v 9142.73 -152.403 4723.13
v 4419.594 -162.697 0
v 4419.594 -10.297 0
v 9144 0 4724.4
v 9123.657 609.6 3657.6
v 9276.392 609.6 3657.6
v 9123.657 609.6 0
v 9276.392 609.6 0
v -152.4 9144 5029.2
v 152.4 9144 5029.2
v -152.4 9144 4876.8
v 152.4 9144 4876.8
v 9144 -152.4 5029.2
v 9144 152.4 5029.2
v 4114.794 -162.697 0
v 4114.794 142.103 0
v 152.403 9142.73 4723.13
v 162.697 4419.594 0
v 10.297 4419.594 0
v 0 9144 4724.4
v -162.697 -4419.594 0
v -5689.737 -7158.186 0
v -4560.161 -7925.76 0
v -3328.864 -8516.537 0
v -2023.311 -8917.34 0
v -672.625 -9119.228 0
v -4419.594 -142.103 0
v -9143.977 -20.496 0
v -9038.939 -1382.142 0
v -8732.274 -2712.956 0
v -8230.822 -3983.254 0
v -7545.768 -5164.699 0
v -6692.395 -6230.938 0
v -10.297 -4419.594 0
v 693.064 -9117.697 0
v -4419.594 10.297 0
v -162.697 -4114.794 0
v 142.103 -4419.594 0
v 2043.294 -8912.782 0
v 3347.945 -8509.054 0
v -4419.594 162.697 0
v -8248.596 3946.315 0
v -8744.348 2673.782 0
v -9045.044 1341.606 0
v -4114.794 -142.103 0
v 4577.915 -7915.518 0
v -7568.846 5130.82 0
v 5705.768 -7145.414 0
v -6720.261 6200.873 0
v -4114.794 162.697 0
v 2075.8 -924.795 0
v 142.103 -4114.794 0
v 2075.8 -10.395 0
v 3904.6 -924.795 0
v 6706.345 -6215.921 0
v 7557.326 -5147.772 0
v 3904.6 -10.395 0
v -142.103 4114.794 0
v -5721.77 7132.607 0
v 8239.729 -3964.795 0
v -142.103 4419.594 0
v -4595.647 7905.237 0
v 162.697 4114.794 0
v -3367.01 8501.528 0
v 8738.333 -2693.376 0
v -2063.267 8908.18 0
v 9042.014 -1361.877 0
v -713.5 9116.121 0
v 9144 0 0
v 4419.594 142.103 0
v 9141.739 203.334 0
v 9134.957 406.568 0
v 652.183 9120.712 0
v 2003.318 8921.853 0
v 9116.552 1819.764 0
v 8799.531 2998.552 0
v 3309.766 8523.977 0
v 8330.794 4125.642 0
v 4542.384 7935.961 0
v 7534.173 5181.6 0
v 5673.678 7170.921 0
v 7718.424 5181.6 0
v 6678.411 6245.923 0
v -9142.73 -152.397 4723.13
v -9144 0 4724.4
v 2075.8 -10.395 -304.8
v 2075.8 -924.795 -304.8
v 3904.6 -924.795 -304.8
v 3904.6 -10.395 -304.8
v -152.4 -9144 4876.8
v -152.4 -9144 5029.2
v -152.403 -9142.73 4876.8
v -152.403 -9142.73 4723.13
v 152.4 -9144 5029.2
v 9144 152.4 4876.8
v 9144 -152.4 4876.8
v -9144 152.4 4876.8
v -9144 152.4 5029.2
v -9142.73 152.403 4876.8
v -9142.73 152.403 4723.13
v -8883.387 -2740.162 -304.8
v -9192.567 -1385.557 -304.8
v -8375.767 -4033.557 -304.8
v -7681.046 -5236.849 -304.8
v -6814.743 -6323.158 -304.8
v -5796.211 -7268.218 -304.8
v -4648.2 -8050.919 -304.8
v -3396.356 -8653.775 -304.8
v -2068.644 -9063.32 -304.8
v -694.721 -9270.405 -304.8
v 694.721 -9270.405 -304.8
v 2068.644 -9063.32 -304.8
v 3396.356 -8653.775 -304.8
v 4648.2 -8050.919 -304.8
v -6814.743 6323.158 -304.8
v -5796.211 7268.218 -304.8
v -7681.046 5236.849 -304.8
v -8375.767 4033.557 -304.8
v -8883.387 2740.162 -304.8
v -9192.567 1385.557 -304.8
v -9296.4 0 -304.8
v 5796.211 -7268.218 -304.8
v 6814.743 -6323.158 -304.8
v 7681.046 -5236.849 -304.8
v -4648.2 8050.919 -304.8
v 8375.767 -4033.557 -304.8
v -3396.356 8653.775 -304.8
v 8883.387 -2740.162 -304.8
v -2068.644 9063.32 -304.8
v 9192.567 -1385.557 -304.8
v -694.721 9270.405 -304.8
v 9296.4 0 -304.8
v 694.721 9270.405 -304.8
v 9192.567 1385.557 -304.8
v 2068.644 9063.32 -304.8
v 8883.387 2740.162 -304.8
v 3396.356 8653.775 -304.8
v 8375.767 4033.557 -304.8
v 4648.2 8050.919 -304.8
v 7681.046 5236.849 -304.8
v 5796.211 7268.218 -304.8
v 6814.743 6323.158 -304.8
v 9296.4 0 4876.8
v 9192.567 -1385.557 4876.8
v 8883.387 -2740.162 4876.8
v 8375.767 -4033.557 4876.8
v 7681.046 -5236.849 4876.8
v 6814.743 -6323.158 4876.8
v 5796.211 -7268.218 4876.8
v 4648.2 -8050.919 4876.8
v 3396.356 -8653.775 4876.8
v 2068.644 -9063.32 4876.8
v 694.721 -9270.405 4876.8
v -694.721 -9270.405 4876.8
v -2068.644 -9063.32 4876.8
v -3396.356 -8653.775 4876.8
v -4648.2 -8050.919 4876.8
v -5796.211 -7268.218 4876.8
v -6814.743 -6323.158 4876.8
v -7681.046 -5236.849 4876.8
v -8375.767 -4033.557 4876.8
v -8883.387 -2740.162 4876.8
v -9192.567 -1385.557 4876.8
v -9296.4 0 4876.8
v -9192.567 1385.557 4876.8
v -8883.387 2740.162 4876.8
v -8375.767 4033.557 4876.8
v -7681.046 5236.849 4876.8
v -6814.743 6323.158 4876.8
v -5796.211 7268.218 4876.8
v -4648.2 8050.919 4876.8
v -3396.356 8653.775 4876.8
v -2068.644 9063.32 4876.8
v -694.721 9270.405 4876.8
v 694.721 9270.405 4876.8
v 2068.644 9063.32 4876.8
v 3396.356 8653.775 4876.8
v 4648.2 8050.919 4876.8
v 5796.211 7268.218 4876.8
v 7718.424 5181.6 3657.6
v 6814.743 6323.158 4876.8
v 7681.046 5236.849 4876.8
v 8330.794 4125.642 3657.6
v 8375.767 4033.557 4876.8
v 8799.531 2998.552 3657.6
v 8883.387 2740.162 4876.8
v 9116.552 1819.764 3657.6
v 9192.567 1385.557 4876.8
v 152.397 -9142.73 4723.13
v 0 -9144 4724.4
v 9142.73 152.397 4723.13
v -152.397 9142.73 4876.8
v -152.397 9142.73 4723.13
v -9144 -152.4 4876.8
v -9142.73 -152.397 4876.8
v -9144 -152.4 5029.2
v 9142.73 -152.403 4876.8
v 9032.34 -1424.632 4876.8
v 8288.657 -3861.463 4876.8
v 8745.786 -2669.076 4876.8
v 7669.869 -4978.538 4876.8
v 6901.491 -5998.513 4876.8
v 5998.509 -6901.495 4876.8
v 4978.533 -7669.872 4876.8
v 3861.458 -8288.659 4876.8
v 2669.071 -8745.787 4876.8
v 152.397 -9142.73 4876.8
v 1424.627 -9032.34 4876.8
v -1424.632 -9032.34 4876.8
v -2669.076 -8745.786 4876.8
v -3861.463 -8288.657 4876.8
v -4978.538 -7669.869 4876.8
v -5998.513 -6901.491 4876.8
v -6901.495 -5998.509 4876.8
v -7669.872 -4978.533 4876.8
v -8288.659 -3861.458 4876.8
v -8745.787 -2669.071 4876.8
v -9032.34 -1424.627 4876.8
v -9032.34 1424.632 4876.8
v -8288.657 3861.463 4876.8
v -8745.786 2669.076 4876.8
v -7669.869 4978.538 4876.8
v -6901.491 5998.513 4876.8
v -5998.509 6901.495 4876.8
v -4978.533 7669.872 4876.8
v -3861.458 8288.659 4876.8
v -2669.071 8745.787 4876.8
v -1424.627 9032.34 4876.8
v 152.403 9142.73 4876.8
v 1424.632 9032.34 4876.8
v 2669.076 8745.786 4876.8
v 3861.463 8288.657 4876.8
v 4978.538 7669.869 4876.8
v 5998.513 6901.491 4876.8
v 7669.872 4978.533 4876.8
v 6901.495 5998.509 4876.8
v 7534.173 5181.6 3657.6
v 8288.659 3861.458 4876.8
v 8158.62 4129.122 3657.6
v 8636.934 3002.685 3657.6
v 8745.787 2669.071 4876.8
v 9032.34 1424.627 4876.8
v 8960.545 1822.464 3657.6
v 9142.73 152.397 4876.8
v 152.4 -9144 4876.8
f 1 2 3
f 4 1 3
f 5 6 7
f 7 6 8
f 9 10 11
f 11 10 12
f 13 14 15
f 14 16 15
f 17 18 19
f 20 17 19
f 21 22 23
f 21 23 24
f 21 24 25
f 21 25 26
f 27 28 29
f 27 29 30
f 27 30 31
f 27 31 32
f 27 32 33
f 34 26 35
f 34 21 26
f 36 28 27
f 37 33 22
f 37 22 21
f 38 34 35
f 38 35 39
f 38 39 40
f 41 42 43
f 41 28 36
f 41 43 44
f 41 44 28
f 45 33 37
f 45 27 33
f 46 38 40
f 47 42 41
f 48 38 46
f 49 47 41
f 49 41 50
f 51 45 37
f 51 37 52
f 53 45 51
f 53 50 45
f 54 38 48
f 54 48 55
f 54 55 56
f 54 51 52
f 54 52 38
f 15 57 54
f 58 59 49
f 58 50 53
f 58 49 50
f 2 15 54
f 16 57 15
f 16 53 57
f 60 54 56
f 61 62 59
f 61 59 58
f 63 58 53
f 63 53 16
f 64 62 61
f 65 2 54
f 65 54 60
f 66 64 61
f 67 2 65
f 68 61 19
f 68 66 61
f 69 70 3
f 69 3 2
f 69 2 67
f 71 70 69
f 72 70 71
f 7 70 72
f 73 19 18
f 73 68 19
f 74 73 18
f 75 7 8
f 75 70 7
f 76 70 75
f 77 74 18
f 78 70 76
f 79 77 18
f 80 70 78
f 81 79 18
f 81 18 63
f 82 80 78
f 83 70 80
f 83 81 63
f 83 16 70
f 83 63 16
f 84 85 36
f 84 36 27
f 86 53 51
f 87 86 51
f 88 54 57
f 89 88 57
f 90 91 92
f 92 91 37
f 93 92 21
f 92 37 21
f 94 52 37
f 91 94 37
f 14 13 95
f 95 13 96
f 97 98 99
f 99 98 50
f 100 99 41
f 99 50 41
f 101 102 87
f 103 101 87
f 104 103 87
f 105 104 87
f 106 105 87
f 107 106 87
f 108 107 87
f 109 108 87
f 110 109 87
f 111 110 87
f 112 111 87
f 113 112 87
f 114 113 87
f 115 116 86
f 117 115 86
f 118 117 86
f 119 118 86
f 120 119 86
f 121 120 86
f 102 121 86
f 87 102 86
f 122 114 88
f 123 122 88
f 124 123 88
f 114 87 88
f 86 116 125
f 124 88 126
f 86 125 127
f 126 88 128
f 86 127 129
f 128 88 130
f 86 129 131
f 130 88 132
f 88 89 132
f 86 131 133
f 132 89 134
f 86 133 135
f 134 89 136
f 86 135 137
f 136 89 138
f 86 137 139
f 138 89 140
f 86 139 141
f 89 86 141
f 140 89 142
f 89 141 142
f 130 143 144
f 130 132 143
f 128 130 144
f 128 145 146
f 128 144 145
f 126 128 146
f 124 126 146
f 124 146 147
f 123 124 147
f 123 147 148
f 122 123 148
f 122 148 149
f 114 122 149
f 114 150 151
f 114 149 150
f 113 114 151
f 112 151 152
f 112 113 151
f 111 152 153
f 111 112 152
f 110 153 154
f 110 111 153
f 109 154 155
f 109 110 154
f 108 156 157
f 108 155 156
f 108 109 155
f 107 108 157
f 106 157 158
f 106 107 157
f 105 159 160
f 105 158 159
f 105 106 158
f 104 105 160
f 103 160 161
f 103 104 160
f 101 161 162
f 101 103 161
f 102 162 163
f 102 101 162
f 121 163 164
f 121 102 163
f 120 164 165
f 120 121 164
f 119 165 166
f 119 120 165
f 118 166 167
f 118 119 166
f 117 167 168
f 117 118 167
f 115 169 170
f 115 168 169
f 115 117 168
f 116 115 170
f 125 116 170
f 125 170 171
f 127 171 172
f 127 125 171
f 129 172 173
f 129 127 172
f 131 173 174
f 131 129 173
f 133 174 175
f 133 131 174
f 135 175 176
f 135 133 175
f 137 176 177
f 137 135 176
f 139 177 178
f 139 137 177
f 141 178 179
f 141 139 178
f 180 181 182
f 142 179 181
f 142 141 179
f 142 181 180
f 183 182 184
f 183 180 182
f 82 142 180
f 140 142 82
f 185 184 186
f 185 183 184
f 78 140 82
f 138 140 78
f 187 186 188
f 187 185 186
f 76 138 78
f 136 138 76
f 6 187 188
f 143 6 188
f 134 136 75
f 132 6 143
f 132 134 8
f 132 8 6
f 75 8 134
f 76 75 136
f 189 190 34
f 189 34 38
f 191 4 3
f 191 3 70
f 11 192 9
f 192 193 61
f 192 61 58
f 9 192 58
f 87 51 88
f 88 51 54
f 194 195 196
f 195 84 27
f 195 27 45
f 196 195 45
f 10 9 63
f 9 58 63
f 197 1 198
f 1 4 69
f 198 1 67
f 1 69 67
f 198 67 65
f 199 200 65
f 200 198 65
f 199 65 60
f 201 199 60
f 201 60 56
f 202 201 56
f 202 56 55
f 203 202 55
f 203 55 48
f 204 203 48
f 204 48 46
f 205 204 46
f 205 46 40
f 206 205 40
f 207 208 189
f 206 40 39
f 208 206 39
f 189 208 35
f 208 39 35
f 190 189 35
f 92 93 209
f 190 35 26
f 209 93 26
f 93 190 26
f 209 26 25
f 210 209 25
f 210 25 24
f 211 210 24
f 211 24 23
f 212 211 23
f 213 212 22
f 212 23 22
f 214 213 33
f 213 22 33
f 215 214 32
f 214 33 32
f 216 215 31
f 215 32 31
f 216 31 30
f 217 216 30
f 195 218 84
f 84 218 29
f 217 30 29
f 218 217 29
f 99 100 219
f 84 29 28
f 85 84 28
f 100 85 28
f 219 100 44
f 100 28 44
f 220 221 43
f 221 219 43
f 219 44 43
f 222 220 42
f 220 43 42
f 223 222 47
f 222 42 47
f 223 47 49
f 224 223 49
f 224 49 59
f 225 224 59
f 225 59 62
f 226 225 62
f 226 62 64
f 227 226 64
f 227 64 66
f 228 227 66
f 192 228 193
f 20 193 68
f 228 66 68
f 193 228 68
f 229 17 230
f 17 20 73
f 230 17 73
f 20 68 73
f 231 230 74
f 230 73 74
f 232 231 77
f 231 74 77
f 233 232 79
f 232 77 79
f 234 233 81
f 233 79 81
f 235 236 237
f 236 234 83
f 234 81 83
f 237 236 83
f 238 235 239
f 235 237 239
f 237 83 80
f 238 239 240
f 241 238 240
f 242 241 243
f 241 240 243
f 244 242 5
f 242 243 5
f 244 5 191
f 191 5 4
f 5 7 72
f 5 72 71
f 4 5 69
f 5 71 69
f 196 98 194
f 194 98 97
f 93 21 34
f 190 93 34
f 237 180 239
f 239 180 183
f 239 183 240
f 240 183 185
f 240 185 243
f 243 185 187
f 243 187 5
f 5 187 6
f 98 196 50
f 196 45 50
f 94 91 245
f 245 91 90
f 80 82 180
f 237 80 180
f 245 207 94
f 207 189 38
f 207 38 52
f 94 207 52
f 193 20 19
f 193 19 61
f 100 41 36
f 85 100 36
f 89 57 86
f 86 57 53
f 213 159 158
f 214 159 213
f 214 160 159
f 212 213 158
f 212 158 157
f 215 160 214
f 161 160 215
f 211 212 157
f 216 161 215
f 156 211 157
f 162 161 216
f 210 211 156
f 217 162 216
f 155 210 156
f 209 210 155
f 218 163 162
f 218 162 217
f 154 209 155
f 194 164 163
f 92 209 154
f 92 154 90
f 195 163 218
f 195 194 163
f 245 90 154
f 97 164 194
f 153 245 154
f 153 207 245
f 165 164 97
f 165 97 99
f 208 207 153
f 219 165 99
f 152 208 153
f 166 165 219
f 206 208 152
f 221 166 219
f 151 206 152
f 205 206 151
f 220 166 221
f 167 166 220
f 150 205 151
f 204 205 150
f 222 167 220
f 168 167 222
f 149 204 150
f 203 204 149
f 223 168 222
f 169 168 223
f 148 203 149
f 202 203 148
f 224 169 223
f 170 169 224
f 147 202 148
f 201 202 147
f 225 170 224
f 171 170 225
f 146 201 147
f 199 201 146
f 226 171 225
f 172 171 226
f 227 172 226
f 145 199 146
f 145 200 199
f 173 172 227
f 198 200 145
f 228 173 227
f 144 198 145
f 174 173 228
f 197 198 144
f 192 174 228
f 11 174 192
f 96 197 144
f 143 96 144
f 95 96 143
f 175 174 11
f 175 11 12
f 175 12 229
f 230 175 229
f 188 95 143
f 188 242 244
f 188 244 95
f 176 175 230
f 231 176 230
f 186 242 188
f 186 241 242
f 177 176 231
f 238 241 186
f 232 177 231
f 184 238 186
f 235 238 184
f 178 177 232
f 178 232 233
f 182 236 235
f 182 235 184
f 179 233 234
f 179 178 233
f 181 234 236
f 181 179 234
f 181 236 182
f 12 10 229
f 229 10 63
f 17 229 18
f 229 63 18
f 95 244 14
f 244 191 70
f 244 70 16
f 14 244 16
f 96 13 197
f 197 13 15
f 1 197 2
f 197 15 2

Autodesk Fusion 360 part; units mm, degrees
sketch "Sketch1" plane through (0, 0, 0) normal (0, 0, 1) x (1, 0, 0)
  circle A0 centre (0, 0) radius 9144
  line L0 (-9143.9942, 10.2973) -> (-4267.1942, 10.2973) construction
  line L1 (-4114.7942, -142.1027) -> (-4419.5942, -142.1027)
  line L2 (-4419.5942, -142.1027) -> (-4419.5942, 162.6973)
  line L3 (-4419.5942, 162.6973) -> (-4114.7942, 162.6973)
  line L4 (-4114.7942, 162.6973) -> (-4114.7942, -142.1027)
  line L5 (-4114.7942, -142.1027) -> (-4419.5942, 162.6973) construction
  line L6 (-4419.5942, -142.1027) -> (-4114.7942, 162.6973) construction
  line L7 (-162.6973, -4114.7942) -> (142.1027, -4114.7942)
  line L8 (142.1027, -4114.7942) -> (142.1027, -4419.5942)
  line L9 (142.1027, -4419.5942) -> (-162.6973, -4419.5942)
  line L10 (-162.6973, -4419.5942) -> (-162.6973, -4114.7942)
  line L11 (4114.7942, -162.6973) -> (4114.7942, 142.1027)
  line L12 (4114.7942, 142.1027) -> (4419.5942, 142.1027)
  line L13 (4419.5942, 142.1027) -> (4419.5942, -162.6973)
  line L14 (4419.5942, -162.6973) -> (4114.7942, -162.6973)
  line L15 (162.6973, 4114.7942) -> (-142.1027, 4114.7942)
  line L16 (-142.1027, 4114.7942) -> (-142.1027, 4419.5942)
  line L17 (-142.1027, 4419.5942) -> (162.6973, 4419.5942)
  line L18 (162.6973, 4419.5942) -> (162.6973, 4114.7942)
  circle A1 centre (0, 0) radius 9296.4
  point P0 (-4267.1942, 10.2973)
  dimension "d1" = 18288
  dimension "d2" = 4876.8
  dimension "d3" = 304.8
  dimension "d4" = 304.8
  dimension "d6" = 360
  dimension "d7" = 18592.8
extrude "Extrude1" add sketch "Sketch1" along normal blind 4876.8 contours A1
extrude "Extrude2" add sketch "Sketch1" against normal blind 304.8 contours A0 | L1 L2 L3 L4 | L7 L8 L9 L10 | L11 L12 L13 L14 | L15 L16 L17 L18 | A1
ref_plane "WorkPlane1" through (9144, 0, 0) normal (1, 0, 0) x (0, 1, 0)
sketch "Sketch2" plane through (9144, 0, 0) normal (1, 0, 0) x (0, 1, 0)
  line L0 (0, 0) -> (0, 4876.8)
  line L1 (-152.4, 4724.4) -> (152.4, 4724.4)
  line L2 (152.4, 4724.4) -> (152.4, 5029.2)
  line L3 (152.4, 5029.2) -> (-152.4, 5029.2)
  line L4 (-152.4, 5029.2) -> (-152.4, 4724.4)
  line L5 (-152.4, 4724.4) -> (152.4, 5029.2) construction
  line L6 (152.4, 4724.4) -> (-152.4, 5029.2) construction
  line L7 (609.6, 0) -> (5181.6, 0)
  line L8 (5181.6, 0) -> (5181.6, 3657.6)
  line L9 (5181.6, 3657.6) -> (609.6, 3657.6)
  line L10 (609.6, 3657.6) -> (609.6, 0)
  point P0 (0, 4876.8)
  dimension "d13" = 4876.8
  dimension "d14" = 304.8
  dimension "d15" = 304.8
  dimension "d18" = 4572
  dimension "d19" = 3657.6
loft "Loft1" add profiles "Sketch2", "Sketch1" section 1 contours L1 L2 L3 L4 section 2 contours L11 L12 L13 L14
pattern_circular "C-Pattern1" count 4 over 360 about axis through (0, 0, 1.75) along (0, 0, 1) of "Loft1"
extrude "Extrude4" cut sketch "Sketch2" against normal blind 5486.4 contours L7 L8 L9 L10
extrude "Extrude5" cut 1 faces at (9144, 965.2, 2438.4) along direction (1, 0, 0) blind 2438.4
sketch "Sketch3" plane through (0, 0, 0) normal (0, 0, 1) x (1, 0, 0)
  line L0 (2075.8003, -924.7952) -> (3904.6003, -924.7952)
  line L1 (3904.6003, -924.7952) -> (3904.6003, -10.3952)
  line L2 (3904.6003, -10.3952) -> (2075.8003, -10.3952)
  line L3 (2075.8003, -10.3952) -> (2075.8003, -924.7952)
  dimension "d26" = 1828.8
  dimension "d27" = 914.4
extrude "Extrude6" cut sketch "Sketch3" against normal blind 4572
extrude "Extrude3" [suppressed]
